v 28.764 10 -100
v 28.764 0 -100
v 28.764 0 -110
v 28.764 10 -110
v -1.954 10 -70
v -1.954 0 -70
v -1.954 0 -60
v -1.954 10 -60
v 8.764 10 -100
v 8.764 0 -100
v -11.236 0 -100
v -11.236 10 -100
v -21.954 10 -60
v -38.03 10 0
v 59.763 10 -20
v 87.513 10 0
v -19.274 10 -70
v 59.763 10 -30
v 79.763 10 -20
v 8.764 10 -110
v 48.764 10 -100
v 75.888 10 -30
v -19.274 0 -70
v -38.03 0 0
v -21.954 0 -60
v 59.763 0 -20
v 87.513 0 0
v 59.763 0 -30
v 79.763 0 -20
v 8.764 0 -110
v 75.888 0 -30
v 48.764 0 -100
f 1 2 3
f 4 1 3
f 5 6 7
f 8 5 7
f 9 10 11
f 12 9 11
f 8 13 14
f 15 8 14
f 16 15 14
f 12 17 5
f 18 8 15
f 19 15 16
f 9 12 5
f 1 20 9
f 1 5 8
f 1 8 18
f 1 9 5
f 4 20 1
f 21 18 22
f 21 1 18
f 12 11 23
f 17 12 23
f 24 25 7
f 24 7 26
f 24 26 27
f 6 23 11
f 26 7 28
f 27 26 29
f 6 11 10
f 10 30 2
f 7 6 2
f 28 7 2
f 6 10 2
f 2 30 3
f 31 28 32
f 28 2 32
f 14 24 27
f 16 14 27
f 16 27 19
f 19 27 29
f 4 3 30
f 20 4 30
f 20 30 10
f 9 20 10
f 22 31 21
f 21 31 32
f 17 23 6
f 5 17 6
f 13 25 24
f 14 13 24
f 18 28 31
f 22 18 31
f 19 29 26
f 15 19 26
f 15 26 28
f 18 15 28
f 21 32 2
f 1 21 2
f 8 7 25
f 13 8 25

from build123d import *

# Parameters (mm, degrees)
BOSS_EXTRUDE1_DEPTH = 10


with BuildPart() as part:
    # Sketch1 → Boss-Extrude1 (new body)
    with BuildSketch(Plane(origin=(0, 0, 0), x_dir=(1, 0, 0), z_dir=(0, 1, 0))):
        Polygon((0, 0), (87.513060243, 0), (79.763338482, 20), (59.763338482, 20), (59.763338482, 30), (75.888477602, 30), (48.76445144, 100), (28.76445144, 100), (28.76445144, 110), (8.76445144, 110), (8.76445144, 100), (-11.23554856, 100), (-19.274024332, 70), (-1.953516257, 70), (-1.953516257, 60), (-21.953516257, 60), (-38.030467803, 0), align=None)
    extrude(amount=BOSS_EXTRUDE1_DEPTH)


solid = part.part
